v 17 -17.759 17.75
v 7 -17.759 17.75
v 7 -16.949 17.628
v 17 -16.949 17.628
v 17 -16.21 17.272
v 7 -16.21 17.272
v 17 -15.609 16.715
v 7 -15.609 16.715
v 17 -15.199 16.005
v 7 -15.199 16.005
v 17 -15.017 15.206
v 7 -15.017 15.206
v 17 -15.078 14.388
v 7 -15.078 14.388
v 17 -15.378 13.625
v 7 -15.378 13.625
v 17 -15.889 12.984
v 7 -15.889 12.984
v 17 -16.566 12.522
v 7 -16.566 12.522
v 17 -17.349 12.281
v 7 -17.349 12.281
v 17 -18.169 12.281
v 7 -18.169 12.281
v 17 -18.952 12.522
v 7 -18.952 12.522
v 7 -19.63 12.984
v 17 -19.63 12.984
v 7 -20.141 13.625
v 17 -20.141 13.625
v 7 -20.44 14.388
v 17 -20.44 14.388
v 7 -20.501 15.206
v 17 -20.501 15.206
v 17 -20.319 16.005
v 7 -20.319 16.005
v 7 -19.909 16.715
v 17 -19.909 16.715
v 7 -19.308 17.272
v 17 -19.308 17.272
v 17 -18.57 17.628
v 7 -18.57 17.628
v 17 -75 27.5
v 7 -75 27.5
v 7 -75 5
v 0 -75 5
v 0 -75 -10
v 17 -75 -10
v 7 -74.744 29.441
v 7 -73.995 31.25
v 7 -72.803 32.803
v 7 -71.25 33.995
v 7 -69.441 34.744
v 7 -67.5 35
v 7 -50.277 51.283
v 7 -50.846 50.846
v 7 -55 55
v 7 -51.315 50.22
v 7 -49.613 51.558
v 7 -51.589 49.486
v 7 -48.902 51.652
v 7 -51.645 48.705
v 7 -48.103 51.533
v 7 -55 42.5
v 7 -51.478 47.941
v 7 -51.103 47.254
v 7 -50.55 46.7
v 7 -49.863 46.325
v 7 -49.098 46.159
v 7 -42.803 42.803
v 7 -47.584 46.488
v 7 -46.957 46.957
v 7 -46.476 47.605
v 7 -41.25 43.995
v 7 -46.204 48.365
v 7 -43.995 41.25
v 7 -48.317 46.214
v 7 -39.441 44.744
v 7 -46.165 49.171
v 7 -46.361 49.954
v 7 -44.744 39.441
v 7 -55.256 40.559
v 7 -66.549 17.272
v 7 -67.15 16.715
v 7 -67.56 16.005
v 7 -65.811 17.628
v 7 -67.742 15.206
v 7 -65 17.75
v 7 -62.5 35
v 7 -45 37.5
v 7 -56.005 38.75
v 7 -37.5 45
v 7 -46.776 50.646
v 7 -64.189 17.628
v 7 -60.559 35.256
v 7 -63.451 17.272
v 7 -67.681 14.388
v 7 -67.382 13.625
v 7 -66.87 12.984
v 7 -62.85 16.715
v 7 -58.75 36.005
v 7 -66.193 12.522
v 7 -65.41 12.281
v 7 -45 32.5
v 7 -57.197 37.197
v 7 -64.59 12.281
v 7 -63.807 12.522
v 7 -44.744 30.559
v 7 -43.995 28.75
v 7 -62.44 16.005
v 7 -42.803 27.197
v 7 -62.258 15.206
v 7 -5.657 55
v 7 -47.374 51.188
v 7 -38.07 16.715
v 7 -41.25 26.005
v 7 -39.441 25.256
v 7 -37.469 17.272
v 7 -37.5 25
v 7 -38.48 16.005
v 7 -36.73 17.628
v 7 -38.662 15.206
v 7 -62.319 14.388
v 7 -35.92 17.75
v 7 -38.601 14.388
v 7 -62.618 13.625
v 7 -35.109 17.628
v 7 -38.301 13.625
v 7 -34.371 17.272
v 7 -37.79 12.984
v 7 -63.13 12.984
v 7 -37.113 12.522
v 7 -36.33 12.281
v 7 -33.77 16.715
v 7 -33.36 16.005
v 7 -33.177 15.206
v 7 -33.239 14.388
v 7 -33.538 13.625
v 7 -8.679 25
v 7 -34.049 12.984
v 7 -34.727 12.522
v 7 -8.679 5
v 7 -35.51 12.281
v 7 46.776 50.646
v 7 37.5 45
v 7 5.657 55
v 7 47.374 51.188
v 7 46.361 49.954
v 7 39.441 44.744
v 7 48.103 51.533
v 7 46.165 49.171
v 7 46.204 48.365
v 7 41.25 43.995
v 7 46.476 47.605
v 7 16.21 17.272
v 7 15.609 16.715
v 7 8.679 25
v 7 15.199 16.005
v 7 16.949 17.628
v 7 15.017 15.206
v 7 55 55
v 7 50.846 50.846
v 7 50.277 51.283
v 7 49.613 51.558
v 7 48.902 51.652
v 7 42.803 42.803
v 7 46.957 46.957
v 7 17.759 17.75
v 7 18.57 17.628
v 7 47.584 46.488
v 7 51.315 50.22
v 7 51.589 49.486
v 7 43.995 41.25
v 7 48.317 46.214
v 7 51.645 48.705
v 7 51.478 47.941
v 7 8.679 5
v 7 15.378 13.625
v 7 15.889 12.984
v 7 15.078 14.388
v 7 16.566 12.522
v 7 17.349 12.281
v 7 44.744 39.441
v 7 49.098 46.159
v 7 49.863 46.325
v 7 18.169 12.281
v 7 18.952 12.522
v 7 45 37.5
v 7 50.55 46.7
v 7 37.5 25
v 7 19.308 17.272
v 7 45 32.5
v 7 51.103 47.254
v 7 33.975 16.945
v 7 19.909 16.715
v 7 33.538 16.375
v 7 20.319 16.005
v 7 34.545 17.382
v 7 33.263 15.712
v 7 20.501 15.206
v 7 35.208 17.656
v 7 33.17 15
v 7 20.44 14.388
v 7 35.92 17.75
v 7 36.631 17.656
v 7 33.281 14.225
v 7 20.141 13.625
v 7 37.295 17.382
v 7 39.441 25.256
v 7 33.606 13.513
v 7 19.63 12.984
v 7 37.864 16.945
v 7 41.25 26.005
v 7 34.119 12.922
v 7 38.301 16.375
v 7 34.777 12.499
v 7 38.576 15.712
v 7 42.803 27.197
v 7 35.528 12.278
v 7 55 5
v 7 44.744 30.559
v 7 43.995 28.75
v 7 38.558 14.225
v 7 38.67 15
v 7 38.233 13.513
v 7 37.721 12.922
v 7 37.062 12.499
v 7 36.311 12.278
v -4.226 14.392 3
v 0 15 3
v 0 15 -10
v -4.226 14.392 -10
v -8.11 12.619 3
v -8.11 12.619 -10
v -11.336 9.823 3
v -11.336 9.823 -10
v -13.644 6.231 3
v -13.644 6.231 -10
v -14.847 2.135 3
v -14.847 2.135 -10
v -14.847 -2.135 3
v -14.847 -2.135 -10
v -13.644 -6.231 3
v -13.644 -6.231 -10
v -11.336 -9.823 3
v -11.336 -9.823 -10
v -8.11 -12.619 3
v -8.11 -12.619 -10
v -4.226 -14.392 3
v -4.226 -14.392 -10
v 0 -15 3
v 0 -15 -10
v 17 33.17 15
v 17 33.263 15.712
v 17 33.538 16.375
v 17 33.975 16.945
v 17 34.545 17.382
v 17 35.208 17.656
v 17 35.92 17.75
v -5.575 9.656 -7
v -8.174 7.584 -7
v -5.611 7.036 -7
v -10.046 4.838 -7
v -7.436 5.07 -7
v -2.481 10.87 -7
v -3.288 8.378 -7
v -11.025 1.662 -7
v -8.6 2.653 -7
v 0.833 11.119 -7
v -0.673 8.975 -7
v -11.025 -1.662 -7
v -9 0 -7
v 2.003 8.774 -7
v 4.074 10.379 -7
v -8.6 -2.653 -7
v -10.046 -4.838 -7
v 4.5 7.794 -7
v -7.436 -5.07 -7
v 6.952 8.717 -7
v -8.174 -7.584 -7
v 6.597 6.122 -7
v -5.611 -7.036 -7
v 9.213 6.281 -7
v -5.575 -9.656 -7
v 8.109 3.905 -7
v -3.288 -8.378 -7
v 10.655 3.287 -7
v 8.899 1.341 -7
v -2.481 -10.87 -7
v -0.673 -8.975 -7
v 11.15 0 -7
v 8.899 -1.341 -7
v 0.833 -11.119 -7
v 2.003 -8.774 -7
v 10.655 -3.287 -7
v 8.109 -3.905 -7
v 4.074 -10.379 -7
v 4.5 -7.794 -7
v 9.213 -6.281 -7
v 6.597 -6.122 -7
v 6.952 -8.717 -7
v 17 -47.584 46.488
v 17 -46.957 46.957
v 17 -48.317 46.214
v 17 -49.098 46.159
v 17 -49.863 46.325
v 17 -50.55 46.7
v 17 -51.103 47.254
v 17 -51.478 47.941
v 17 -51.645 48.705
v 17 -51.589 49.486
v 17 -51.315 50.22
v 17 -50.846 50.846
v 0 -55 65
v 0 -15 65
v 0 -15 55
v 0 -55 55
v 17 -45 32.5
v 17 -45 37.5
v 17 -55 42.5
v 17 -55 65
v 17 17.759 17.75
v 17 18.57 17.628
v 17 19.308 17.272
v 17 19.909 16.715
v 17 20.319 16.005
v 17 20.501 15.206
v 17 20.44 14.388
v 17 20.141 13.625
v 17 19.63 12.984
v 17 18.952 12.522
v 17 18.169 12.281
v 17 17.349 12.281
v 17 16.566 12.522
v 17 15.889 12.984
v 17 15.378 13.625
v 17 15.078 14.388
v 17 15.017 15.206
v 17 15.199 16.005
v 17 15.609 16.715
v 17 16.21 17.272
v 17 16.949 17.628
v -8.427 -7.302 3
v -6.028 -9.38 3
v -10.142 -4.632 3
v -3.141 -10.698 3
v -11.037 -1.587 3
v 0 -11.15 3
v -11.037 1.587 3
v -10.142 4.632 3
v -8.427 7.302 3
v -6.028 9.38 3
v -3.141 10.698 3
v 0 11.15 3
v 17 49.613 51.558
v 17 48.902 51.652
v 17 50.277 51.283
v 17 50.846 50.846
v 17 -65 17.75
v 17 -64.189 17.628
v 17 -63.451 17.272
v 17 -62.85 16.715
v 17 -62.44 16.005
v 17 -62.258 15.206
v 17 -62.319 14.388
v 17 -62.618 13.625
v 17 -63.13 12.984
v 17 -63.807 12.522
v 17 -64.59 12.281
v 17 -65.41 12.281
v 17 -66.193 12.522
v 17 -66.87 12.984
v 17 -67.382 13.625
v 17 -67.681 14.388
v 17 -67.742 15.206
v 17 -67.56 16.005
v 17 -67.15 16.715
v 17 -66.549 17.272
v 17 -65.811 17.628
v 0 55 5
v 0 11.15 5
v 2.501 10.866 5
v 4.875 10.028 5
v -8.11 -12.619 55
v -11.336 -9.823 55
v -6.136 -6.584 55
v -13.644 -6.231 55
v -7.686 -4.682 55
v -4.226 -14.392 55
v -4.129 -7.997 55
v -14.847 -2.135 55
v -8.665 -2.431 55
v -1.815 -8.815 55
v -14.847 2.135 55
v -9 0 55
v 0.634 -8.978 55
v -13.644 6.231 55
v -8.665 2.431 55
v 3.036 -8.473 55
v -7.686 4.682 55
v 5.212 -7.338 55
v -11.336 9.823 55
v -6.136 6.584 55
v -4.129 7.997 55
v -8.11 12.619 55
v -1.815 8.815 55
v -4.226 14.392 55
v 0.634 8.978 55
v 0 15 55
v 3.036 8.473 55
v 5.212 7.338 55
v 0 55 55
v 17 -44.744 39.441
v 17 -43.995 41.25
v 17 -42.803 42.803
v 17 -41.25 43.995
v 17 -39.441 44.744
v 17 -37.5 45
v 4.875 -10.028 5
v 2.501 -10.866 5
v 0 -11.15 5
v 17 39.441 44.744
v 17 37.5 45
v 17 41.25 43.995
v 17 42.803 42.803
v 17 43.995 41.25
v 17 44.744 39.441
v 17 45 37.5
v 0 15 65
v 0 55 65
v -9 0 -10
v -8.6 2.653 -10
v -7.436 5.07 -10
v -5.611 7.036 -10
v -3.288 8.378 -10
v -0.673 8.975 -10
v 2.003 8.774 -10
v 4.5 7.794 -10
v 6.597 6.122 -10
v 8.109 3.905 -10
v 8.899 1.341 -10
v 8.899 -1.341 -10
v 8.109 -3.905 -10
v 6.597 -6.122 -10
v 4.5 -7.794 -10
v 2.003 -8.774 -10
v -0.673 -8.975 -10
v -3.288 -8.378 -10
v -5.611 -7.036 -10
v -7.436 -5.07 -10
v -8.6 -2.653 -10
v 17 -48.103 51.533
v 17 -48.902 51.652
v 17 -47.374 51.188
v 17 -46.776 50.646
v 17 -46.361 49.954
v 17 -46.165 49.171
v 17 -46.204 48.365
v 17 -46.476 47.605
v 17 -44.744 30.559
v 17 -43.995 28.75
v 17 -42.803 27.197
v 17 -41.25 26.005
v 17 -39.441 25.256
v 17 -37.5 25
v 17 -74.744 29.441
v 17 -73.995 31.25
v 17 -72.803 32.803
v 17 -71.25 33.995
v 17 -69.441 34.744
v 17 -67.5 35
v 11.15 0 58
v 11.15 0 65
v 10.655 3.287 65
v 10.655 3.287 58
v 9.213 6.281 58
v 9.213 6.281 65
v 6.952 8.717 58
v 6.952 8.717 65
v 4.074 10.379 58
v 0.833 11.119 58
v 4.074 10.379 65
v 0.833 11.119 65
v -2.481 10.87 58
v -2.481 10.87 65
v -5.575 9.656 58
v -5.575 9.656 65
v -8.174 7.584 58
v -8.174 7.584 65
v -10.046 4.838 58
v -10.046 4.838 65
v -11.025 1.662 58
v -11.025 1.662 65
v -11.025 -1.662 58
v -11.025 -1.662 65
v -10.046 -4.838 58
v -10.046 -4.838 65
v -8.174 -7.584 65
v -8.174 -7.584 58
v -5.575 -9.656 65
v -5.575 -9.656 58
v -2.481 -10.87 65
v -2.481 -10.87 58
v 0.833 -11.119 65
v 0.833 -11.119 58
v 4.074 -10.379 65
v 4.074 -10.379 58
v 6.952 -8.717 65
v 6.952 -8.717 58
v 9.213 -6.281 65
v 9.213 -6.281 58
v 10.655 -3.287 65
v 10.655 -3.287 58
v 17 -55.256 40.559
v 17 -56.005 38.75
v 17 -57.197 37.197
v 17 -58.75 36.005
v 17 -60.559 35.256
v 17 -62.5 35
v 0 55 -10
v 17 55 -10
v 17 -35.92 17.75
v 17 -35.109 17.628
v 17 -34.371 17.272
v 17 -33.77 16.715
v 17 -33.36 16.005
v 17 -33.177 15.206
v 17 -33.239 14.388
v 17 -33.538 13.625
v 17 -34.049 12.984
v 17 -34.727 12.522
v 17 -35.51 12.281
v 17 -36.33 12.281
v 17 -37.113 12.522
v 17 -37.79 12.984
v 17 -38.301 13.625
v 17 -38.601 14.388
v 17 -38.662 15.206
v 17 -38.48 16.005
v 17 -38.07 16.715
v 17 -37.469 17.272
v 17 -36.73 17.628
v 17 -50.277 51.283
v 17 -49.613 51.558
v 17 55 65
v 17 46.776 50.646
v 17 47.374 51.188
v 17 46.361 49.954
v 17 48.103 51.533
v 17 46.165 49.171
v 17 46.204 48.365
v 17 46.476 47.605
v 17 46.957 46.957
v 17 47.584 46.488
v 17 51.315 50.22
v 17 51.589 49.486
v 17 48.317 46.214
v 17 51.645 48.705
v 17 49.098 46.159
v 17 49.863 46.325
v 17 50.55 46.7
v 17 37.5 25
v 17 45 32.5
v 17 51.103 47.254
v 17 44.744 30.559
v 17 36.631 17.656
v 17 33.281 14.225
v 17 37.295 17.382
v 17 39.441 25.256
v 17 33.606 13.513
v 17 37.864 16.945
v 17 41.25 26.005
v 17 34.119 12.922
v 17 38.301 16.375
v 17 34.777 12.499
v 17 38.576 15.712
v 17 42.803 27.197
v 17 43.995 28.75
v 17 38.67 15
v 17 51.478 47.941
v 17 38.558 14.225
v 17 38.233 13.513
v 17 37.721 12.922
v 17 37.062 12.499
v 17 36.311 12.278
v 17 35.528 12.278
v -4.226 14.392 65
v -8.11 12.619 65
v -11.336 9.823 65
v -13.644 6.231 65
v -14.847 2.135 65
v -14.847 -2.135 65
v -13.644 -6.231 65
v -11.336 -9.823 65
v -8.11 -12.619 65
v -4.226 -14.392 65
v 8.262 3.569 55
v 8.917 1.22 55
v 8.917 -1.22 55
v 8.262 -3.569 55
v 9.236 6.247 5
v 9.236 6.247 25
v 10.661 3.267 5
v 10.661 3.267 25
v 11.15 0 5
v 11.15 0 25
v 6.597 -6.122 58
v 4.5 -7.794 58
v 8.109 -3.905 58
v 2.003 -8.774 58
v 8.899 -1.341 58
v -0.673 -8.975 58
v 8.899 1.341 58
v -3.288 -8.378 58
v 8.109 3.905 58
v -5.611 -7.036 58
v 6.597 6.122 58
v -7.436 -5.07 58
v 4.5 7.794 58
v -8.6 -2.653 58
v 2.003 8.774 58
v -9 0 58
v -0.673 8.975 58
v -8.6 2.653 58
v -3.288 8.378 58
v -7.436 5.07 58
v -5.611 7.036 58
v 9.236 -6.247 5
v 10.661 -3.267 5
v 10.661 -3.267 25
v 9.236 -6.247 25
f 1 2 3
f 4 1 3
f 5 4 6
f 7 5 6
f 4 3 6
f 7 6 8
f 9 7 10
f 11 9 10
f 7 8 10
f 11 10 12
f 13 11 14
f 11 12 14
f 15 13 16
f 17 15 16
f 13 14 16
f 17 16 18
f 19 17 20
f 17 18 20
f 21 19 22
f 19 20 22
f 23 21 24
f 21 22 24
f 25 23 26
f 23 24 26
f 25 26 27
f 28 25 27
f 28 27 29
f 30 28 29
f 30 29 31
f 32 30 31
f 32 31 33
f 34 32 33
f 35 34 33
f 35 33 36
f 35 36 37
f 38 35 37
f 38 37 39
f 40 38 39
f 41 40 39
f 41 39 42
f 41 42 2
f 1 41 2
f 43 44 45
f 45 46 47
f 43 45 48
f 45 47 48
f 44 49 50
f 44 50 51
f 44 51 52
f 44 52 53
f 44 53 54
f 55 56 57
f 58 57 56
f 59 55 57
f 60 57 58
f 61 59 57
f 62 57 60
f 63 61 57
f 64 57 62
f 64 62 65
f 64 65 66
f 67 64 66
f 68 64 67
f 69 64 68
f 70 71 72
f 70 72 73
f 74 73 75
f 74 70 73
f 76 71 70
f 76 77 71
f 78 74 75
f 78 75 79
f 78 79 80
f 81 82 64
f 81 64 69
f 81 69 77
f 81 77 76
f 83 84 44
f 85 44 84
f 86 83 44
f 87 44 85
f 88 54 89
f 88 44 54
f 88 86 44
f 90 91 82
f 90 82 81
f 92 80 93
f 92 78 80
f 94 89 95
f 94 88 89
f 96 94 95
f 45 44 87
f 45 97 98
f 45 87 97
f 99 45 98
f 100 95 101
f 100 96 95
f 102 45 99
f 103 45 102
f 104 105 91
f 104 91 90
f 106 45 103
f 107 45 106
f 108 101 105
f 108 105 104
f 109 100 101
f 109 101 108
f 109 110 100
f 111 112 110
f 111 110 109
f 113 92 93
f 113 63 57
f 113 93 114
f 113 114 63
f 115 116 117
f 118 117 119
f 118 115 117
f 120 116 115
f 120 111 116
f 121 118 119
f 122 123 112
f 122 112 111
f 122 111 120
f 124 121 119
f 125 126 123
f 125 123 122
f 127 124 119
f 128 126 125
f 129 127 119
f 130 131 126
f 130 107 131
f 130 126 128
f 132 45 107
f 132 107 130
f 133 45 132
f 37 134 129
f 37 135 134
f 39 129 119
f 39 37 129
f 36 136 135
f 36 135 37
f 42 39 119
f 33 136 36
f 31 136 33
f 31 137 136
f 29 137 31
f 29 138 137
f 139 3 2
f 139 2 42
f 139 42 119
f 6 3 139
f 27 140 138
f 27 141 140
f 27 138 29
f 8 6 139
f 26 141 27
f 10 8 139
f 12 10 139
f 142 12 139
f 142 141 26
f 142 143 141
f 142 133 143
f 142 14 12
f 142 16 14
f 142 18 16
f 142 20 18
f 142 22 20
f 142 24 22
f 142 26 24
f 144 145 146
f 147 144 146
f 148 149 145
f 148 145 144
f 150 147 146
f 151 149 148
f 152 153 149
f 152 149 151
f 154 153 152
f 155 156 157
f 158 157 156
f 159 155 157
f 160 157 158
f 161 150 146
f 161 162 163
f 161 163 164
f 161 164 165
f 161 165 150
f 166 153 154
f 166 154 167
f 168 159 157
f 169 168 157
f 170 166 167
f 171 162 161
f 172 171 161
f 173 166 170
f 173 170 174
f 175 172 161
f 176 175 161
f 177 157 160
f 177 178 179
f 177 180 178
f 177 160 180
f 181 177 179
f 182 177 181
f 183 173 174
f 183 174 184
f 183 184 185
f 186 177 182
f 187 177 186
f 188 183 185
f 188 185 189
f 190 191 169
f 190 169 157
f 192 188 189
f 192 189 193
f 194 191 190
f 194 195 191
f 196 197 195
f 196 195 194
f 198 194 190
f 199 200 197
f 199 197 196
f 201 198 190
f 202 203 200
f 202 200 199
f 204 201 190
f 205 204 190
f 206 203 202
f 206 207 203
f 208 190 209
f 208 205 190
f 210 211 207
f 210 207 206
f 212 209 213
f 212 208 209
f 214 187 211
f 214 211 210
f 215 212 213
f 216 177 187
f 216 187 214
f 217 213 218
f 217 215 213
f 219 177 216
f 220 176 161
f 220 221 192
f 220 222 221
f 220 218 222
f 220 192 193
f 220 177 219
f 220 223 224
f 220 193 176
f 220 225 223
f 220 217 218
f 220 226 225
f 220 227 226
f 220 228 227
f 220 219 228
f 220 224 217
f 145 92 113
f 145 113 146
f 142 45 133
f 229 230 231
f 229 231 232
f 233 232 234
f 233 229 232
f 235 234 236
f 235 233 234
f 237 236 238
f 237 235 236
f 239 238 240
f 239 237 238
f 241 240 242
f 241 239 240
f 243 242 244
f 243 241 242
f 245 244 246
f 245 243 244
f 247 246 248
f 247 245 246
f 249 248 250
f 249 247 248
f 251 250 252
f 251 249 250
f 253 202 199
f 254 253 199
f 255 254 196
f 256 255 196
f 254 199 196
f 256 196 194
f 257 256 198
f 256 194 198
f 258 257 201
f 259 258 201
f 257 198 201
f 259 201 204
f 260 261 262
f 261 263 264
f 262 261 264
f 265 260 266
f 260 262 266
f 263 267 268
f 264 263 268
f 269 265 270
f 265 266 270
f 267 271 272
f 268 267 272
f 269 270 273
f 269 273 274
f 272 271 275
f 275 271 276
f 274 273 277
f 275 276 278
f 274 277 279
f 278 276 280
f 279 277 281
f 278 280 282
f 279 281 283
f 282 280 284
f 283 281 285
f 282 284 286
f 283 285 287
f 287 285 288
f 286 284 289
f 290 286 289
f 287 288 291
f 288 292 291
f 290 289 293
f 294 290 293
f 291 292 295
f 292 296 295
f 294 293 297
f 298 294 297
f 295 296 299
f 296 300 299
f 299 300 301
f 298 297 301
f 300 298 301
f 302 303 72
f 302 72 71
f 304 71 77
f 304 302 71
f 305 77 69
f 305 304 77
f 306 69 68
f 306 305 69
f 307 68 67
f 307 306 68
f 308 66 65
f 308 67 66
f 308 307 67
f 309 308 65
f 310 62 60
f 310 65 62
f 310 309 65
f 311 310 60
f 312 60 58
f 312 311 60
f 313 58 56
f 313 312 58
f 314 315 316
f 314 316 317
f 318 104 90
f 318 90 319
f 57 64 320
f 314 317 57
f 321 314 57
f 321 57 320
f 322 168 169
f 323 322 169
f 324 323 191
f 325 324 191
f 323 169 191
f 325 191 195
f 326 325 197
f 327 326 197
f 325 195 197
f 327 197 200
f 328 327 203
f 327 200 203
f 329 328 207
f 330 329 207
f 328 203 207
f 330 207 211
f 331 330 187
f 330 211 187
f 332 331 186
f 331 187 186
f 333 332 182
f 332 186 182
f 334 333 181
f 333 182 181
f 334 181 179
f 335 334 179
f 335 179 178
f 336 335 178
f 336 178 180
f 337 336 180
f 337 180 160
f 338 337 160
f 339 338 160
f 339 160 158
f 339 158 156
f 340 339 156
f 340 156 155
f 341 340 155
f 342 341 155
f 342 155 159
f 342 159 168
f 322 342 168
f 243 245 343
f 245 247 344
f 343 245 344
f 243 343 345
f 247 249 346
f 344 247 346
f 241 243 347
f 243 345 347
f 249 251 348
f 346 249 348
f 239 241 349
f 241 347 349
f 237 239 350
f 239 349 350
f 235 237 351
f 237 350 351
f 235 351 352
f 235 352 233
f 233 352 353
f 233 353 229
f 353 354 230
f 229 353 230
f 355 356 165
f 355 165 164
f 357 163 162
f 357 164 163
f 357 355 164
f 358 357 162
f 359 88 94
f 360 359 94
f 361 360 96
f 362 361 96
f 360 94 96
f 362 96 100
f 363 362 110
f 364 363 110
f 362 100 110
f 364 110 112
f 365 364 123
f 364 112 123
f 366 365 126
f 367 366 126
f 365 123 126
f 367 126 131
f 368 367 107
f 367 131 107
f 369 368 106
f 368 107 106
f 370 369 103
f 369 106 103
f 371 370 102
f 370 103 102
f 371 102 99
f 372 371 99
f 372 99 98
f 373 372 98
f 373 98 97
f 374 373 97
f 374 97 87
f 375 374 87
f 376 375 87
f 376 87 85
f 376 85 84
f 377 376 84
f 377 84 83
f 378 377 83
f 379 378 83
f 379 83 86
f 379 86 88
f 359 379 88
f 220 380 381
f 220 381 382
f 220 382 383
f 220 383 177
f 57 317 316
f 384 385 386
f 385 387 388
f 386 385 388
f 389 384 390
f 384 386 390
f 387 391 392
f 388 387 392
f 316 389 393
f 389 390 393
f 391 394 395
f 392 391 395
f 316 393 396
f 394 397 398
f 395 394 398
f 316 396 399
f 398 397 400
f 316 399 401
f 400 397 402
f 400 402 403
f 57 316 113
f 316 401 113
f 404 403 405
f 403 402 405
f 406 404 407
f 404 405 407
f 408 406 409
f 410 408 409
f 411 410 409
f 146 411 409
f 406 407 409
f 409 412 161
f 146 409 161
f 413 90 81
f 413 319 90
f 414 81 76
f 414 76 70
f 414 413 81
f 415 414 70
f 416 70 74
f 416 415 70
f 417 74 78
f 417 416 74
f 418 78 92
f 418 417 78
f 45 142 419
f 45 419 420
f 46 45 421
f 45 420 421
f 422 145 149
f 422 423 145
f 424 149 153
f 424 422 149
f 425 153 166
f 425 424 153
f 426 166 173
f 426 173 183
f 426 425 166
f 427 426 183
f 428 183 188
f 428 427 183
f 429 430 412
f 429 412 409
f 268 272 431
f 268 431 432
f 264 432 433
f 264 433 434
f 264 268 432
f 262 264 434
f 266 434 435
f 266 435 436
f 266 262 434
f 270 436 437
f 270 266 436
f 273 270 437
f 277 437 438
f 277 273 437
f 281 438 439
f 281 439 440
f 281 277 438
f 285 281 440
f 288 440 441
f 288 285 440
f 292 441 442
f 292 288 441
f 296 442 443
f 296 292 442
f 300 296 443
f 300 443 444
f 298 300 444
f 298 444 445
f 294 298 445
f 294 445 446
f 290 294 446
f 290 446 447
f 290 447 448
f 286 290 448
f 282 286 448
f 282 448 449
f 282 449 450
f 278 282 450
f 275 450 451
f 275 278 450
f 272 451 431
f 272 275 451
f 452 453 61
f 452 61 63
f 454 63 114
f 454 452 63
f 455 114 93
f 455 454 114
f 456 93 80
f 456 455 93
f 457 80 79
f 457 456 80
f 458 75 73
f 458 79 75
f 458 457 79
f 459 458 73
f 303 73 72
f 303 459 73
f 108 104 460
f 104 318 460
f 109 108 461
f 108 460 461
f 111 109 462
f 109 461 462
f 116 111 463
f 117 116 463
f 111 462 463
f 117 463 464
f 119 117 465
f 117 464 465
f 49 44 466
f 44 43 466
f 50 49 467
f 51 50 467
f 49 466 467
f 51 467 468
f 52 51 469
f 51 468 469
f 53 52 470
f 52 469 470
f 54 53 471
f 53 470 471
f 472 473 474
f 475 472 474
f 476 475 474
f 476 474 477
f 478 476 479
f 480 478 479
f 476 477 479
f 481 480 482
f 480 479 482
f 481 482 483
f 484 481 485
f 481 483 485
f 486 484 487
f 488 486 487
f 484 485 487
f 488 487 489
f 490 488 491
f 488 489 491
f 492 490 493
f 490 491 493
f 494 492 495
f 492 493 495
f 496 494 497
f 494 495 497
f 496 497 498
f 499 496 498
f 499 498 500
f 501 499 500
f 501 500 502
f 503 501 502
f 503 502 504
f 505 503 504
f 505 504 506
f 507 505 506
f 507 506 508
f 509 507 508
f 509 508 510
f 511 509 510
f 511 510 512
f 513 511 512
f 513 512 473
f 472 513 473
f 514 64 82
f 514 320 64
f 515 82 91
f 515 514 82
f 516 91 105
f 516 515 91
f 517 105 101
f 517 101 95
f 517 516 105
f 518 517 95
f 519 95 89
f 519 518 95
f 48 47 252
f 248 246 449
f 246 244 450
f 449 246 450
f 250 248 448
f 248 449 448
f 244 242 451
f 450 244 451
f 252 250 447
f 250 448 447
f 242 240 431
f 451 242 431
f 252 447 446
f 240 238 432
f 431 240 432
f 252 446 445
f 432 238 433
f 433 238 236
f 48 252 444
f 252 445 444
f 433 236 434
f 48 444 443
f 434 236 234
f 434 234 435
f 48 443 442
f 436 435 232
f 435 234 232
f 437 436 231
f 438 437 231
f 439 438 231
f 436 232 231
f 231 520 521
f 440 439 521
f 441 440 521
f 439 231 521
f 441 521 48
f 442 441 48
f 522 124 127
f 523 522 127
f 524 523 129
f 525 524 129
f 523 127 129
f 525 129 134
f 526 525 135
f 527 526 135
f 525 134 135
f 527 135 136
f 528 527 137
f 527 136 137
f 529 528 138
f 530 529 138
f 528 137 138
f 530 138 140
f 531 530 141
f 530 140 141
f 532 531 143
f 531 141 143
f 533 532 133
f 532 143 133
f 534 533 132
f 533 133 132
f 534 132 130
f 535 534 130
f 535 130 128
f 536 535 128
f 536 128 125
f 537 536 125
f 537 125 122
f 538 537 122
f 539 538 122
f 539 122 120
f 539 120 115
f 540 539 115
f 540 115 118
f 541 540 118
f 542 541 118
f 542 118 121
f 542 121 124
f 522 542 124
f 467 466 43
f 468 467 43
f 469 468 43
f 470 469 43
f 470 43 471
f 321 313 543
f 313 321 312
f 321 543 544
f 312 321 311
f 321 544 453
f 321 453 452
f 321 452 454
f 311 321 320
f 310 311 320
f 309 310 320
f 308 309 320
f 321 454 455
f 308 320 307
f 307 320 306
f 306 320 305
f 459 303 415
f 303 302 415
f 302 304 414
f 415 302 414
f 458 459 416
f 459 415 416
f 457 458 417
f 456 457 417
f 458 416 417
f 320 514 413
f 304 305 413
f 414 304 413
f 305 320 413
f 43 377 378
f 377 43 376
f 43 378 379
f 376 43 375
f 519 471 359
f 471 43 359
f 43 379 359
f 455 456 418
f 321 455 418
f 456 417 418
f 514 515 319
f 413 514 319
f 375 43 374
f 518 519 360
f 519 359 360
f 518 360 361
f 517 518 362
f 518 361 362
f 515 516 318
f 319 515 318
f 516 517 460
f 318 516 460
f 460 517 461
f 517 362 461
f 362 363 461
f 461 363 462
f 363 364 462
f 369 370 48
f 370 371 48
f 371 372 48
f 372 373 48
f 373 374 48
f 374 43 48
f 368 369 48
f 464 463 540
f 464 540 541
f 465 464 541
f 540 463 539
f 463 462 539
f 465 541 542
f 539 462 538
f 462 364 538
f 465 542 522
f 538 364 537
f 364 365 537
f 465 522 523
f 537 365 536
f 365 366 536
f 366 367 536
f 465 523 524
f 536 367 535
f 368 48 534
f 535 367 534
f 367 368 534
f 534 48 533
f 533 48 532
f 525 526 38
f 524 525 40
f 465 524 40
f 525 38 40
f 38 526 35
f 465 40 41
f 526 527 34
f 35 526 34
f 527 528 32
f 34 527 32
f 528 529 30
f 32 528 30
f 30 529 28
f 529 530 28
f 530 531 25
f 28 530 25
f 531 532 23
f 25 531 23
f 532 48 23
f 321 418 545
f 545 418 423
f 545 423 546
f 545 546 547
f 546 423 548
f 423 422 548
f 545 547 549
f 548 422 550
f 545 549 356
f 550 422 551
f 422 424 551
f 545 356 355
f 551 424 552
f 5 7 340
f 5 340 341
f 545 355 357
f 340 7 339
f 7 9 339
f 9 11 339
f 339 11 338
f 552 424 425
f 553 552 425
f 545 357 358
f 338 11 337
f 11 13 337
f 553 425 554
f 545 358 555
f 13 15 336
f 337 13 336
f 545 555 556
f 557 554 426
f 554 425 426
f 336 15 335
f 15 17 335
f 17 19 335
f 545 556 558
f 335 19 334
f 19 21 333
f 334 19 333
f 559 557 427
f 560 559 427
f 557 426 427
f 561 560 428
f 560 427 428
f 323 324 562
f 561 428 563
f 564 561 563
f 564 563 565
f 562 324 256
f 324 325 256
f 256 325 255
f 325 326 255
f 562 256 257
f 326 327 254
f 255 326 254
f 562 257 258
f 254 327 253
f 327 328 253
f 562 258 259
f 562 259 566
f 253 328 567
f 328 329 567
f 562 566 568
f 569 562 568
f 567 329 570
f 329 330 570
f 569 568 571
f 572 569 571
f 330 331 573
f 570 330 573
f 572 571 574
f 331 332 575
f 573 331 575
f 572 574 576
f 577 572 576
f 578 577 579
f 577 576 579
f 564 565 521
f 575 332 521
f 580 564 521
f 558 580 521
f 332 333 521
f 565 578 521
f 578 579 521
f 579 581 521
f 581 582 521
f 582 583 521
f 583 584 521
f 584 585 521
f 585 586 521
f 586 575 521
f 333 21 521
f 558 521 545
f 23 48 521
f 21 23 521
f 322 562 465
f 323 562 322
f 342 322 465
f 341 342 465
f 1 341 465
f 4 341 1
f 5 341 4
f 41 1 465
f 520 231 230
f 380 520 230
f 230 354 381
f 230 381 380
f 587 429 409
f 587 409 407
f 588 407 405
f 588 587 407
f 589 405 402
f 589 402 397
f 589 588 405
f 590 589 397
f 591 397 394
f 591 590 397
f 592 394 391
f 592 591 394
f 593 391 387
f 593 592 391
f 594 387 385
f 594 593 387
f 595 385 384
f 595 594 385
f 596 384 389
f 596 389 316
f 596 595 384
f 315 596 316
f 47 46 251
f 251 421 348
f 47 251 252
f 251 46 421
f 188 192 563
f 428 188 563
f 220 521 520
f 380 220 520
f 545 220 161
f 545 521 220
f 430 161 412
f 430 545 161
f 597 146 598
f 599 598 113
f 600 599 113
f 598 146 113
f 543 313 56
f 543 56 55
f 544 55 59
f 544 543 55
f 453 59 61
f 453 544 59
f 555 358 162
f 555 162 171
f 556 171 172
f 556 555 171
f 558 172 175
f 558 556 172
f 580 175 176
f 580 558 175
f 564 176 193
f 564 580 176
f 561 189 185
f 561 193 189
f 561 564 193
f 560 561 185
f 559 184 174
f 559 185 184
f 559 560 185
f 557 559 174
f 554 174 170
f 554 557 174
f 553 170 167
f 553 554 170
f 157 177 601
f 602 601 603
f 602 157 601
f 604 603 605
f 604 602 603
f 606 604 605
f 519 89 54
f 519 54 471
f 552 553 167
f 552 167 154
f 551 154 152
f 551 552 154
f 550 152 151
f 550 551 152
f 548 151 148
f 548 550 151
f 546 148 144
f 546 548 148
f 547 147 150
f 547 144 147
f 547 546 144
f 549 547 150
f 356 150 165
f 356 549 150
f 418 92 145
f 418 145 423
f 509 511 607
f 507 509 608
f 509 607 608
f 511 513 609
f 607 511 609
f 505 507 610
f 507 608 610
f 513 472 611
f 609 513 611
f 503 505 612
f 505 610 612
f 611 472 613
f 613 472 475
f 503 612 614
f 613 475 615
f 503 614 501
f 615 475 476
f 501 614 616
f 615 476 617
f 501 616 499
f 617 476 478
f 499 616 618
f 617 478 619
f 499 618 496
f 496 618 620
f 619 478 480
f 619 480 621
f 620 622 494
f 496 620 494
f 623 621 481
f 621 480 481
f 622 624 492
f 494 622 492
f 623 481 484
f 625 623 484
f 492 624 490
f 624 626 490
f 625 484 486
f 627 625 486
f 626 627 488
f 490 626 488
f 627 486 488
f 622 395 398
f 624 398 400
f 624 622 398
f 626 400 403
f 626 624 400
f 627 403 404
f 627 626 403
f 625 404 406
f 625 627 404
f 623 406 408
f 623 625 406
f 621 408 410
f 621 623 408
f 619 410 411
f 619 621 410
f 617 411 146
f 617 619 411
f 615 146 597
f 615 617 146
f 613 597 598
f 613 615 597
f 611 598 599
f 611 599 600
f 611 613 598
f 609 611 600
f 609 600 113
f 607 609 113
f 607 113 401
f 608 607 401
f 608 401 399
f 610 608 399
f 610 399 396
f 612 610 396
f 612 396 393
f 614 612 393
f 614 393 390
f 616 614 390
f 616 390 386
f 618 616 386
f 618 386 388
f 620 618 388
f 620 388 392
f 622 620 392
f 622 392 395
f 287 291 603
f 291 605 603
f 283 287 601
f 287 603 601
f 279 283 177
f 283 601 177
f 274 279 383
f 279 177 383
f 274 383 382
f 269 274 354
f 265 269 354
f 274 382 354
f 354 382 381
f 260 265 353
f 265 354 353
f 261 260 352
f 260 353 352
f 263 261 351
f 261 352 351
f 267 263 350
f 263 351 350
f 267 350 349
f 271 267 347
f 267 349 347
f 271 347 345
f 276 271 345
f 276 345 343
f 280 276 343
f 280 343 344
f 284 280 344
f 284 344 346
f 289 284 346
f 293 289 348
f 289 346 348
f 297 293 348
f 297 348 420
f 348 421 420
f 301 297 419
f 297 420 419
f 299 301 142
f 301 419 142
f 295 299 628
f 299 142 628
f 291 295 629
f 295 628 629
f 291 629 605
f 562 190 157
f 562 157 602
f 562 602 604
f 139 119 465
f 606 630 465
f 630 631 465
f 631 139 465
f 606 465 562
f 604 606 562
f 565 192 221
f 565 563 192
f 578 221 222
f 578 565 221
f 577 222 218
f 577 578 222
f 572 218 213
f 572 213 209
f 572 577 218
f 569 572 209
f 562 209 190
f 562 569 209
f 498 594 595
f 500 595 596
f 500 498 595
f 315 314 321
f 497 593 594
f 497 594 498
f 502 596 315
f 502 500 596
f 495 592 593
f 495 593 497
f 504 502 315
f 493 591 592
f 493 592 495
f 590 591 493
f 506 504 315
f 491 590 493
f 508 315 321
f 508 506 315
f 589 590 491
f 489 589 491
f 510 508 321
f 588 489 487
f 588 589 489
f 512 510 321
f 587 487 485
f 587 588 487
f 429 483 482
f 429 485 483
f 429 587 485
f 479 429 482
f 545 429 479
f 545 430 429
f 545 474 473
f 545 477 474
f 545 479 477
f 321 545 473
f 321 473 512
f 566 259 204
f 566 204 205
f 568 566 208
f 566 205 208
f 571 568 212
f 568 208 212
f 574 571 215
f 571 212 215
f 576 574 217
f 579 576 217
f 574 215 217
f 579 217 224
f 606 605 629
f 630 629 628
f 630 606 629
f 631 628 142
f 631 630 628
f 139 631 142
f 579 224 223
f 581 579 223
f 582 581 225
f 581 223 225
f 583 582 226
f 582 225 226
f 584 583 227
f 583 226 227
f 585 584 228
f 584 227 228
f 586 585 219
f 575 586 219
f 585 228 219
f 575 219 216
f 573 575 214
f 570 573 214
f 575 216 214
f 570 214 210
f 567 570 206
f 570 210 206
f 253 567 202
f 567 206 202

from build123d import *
from build123d.topology import SkipClean

# Parameters (mm, degrees)
SKETCH2_R               = 15
SKETCH2_R_2             = 11.15
BOSS_EXTRUDE1_DEPTH     = 7
SKETCH3_R               = 15
SKETCH3_R_2             = 9
BOSS_EXTRUDE2_DEPTH     = 3
BOSS_EXTRUDE3_START     = 5
SKETCH4_R               = 15
SKETCH4_R_2             = 11.15
BOSS_EXTRUDE3_DEPTH     = 5
BOSS_EXTRUDE4_DEPTH     = 8
BOSS_EXTRUDE5_START     = 20
SKETCH7_W               = 10
SKETCH7_H               = 30
BOSS_EXTRUDE5_DEPTH     = 20
BOSS_EXTRUDE6_DEPTH     = 7
SKETCH10_W              = 2
SKETCH10_H              = 90
CUT_EXTRUDE1_DEPTH      = 20
SKETCH12_R              = 2.75
CUT_EXTRUDE2_DEPTH      = 20
BOSS_EXTRUDE7_DEPTH     = 10
BOSS_EXTRUDE8_DEPTH     = 10
SKETCH15_W              = 10
SKETCH15_H              = 10
BOSS_EXTRUDE9_DEPTH     = 20
SKETCH16_W              = 10
SKETCH16_H              = 10
BOSS_EXTRUDE10_DEPTH    = 10
SKETCH17_W              = 10
SKETCH17_H              = 10
BOSS_EXTRUDE11_DEPTH    = 90
FILLET1_R               = 7.5
BOSS_EXTRUDE12_START    = 10
SKETCH18_R              = 11.15
BOSS_EXTRUDE12_DEPTH    = 10
BOSS_EXTRUDE13_START    = -3
SKETCH19_R              = 9
BOSS_EXTRUDE13_DEPTH    = 3
CUT_EXTRUDE3_DEPTH      = 88.943163464
CUT_EXTRUDE3_DEPTH_BACK = 88.943163464
SKETCH21_W              = 10
SKETCH21_H              = 10
BOSS_EXTRUDE14_DEPTH    = 20
SKETCH22_W              = 10
SKETCH22_H              = 20
BOSS_EXTRUDE15_DEPTH    = 20
FILLET2_R               = 7.5
SKETCH23_R              = 2.75
CUT_EXTRUDE4_DEPTH      = 20


with BuildPart() as part:
    # Sketch2 → Boss-Extrude1 (new body)
    with BuildSketch(Plane.XY):
        Circle(SKETCH2_R)
        Circle(SKETCH2_R_2, mode=Mode.SUBTRACT)
    extrude(amount=-BOSS_EXTRUDE1_DEPTH)

    # Sketch3 → Boss-Extrude2 (add)
    with BuildSketch(Plane(origin=(0, 0, -7), x_dir=(-1, 0, 0), z_dir=(0, 0, -1))):
        with Locations(Location((0, 0, 0), (0, 0, 180))):
            Circle(SKETCH3_R)
        Circle(SKETCH3_R_2, mode=Mode.SUBTRACT)
    extrude(amount=BOSS_EXTRUDE2_DEPTH)

    # Sketch4 → Boss-Extrude3 (add)
    with BuildSketch(Plane.XY.offset(BOSS_EXTRUDE3_START)):
        Circle(SKETCH4_R)
        Circle(SKETCH4_R_2, mode=Mode.SUBTRACT)
    extrude(amount=-BOSS_EXTRUDE3_DEPTH)

    # Sketch5 → Boss-Extrude4 (add)
    with BuildSketch(Plane.XY.offset(5)):
        with BuildLine():
            Line((0, 45), (0, 15))
            ThreePointArc((0, 15), (10.606601718, 10.606601718), (15, 0))
            ThreePointArc((15, 0), (10.606601718, -10.606601718), (0, -15))
            Line((0, -15), (0, -45))
            Line((0, -45), (17, -45))
            Line((17, -45), (17, 15))
            Line((17, 15), (17, 45))
            Line((17, 45), (0, 45))
        make_face()
    extrude(amount=-BOSS_EXTRUDE4_DEPTH)

    # Sketch7 → Boss-Extrude5 (add)
    with SkipClean():  # the faces are left unmerged after this step: merging them gives an invalid solid
        with BuildSketch(Plane.XY.offset(5).offset(BOSS_EXTRUDE5_START)):
            with Locations((12, 30)):
                Rectangle(SKETCH7_W, SKETCH7_H)
            with BuildLine():
                Line((7, -15), (17, -15))
                Line((17, -15), (17, 15))
                Line((17, 15), (7, 15))
                Line((7, 15), (7, 8.678853611))
                ThreePointArc((7, 8.678853611), (10.059137637, 4.810015592), (11.15, 0))
                ThreePointArc((11.15, 0), (10.059137637, -4.810015592), (7, -8.678853611))
                Line((7, -8.678853611), (7, -15))
            make_face()
            with Locations((12, -30)):
                Rectangle(SKETCH7_W, SKETCH7_H)
        extrude(amount=-BOSS_EXTRUDE5_DEPTH)

    # Sketch9 → Boss-Extrude6 (add)
    with SkipClean():  # the faces are left unmerged after this step: merging them gives an invalid solid
        with BuildSketch(Plane(origin=(0, 0, -3), x_dir=(-1, 0, 0), z_dir=(0, 0, -1))):
            with BuildLine():
                Line((-17, -45), (0, -45))
                Line((0, -45), (0, -15))
                ThreePointArc((0, -15), (-15, 0), (0, 15))
                Line((0, 15), (0, 45))
                Line((0, 45), (-17, 45))
                Line((-17, 45), (-17, -45))
            make_face()
        extrude(amount=BOSS_EXTRUDE6_DEPTH)

    # Sketch10 → Cut-Extrude1 (cut)
    with BuildSketch(Plane.ZY):
        with Locations((4, 0)):
            Rectangle(SKETCH10_W, SKETCH10_H)
    extrude(amount=CUT_EXTRUDE1_DEPTH, mode=Mode.SUBTRACT)

    # Sketch12 → Cut-Extrude2 (cut)
    with BuildSketch(Plane.ZY.offset(-7)):
        with Locations((15, -35.919713403)):
            Circle(SKETCH12_R)
        with Locations((15, -17.759140208)):
            Circle(SKETCH12_R)
        with Locations((15, 17.759140208)):
            Circle(SKETCH12_R)
        with BuildLine():
            ThreePointArc((17.75, 35.919713403), (16.944543648, 37.864257051), (15, 38.669713403))
            Line((15, 38.669713403), (15, 33.169713403))
            ThreePointArc((15, 33.169713403), (16.944543648, 33.975169754), (17.75, 35.919713403))
        make_face()
        with BuildLine():
            Line((15, 33.169713403), (15, 38.669713403))
            ThreePointArc((15, 38.669713403), (12.25, 35.919713403), (15, 33.169713403))
        make_face()
    extrude(amount=-CUT_EXTRUDE2_DEPTH, mode=Mode.SUBTRACT)

    # Sketch13 → Boss-Extrude7 (add)
    with BuildSketch(Plane.XZ.offset(45)):
        Polygon((7, 5), (0, 5), (0, -10), (17, -10), (17, 25), (7, 25), align=None)
    extrude(amount=BOSS_EXTRUDE7_DEPTH)

    # Sketch14 → Boss-Extrude8 (add)
    with BuildSketch(Plane(origin=(0, 45, 0), x_dir=(1, 0, 0), z_dir=(0, 1, 0))):
        Polygon((0, -5), (7, -5), (7, -25), (17, -25), (17, 10), (0, 10), align=None)
    extrude(amount=BOSS_EXTRUDE8_DEPTH)

    # Sketch15 → Boss-Extrude9 (add)
    with BuildSketch(Plane.XY.offset(25)):
        with Locations((12, 50)):
            Rectangle(SKETCH15_W, SKETCH15_H)
        with Locations((12, -50)):
            Rectangle(SKETCH15_W, SKETCH15_H)
    extrude(amount=BOSS_EXTRUDE9_DEPTH)

    # Sketch16 → Boss-Extrude10 (add)
    with BuildSketch(Plane.XY.offset(45)):
        with Locations((12, 50)):
            Rectangle(SKETCH16_W, SKETCH16_H)
        with Locations((12, -50)):
            Rectangle(SKETCH16_W, SKETCH16_H)
    extrude(amount=BOSS_EXTRUDE10_DEPTH)

    # Sketch17 → Boss-Extrude11 (add)
    with BuildSketch(Plane(origin=(0, -45, 0), x_dir=(1, 0, 0), z_dir=(0, 1, 0))):
        with Locations((12, -50)):
            Rectangle(SKETCH17_W, SKETCH17_H)
    extrude(amount=BOSS_EXTRUDE11_DEPTH)

    # Fillet1
    fillet1_edges = [part.edges().sort_by_distance(p)[0] for p in [
        (12, 45, 25),
        (12, -45, 25),
        (12, -45, 45),
        (12, 45, 45),
    ]]
    fillet(fillet1_edges, radius=FILLET1_R)

    # Sketch18 → Boss-Extrude12 (add)
    with BuildSketch(Plane.XY.offset(55).offset(BOSS_EXTRUDE12_START)):
        with BuildLine():
            ThreePointArc((0, 15), (-15, 0), (0, -15))
            Line((0, -15), (0, -55))
            Line((0, -55), (17, -55))
            Line((17, -55), (17, 55))
            Line((17, 55), (0, 55))
            Line((0, 55), (0, 15))
        make_face()
        Circle(SKETCH18_R, mode=Mode.SUBTRACT)
    extrude(amount=-BOSS_EXTRUDE12_DEPTH)

    # Sketch19 → Boss-Extrude13 (add)
    with BuildSketch(Plane(origin=(0, 0, 55), x_dir=(-1, 0, 0), z_dir=(0, 0, -1)).offset(BOSS_EXTRUDE13_START)):
        with BuildLine():
            Line((0, 15), (0, 55))
            Line((0, 55), (-17, 55))
            Line((-17, 55), (-17, -55))
            Line((-17, -55), (0, -55))
            Line((0, -55), (0, -15))
            ThreePointArc((0, -15), (15, 0), (0, 15))
        make_face()
        Circle(SKETCH19_R, mode=Mode.SUBTRACT)
    extrude(amount=BOSS_EXTRUDE13_DEPTH)

    # Sketch20 → Cut-Extrude3 (cut, two sides: drawn at the far end of the back side and taken through both)
    with BuildSketch(Plane.ZY.offset(-7).offset(-CUT_EXTRUDE3_DEPTH_BACK)):
        with BuildLine():
            ThreePointArc((51.651650429, -48.901650429), (49.954029868, -46.360981715), (46.957106781, -46.957106781))
            Line((46.957106781, -46.957106781), (50.846194078, -50.846194078))
            ThreePointArc((50.846194078, -50.846194078), (51.442319144, -49.954029868), (51.651650429, -48.901650429))
        make_face()
        with BuildLine():
            Line((50.846194078, -50.846194078), (46.957106781, -46.957106781))
            ThreePointArc((46.957106781, -46.957106781), (46.957106781, -50.846194078), (50.846194078, -50.846194078))
        make_face()
        with BuildLine():
            ThreePointArc((51.651650429, 48.901650429), (51.442319144, 49.954029868), (50.846194078, 50.846194078))
            Line((50.846194078, 50.846194078), (46.957106781, 46.957106781))
            ThreePointArc((46.957106781, 46.957106781), (49.954029868, 46.360981715), (51.651650429, 48.901650429))
        make_face()
        with BuildLine():
            Line((46.957106781, 46.957106781), (50.846194078, 50.846194078))
            ThreePointArc((50.846194078, 50.846194078), (46.957106781, 50.846194078), (46.957106781, 46.957106781))
        make_face()
    extrude(amount=CUT_EXTRUDE3_DEPTH + CUT_EXTRUDE3_DEPTH_BACK, mode=Mode.SUBTRACT)

    # Sketch21 → Boss-Extrude14 (add)
    with BuildSketch(Plane.XZ.offset(55)):
        Polygon((0, 5), (0, -10), (17, -10), (17, 5), (7, 5), align=None)
        with Locations((12, 10)):
            Rectangle(SKETCH21_W, SKETCH21_H)
    extrude(amount=BOSS_EXTRUDE14_DEPTH)

    # Sketch22 → Boss-Extrude15 (add)
    with BuildSketch(Plane.XY.offset(15)):
        with Locations((12, -65)):
            Rectangle(SKETCH22_W, SKETCH22_H)
    extrude(amount=BOSS_EXTRUDE15_DEPTH)

    # Fillet2
    fillet2_edges = [part.edges().sort_by_distance(p)[0] for p in [
        (12, -55, 35),
        (12, -75, 35),
    ]]
    fillet(fillet2_edges, radius=FILLET2_R)

    # Sketch23 → Cut-Extrude4 (cut)
    with BuildSketch(Plane.ZY.offset(-7)):
        with Locations((15, -65)):
            Circle(SKETCH23_R)
    extrude(amount=-CUT_EXTRUDE4_DEPTH, mode=Mode.SUBTRACT)


solid = part.part
